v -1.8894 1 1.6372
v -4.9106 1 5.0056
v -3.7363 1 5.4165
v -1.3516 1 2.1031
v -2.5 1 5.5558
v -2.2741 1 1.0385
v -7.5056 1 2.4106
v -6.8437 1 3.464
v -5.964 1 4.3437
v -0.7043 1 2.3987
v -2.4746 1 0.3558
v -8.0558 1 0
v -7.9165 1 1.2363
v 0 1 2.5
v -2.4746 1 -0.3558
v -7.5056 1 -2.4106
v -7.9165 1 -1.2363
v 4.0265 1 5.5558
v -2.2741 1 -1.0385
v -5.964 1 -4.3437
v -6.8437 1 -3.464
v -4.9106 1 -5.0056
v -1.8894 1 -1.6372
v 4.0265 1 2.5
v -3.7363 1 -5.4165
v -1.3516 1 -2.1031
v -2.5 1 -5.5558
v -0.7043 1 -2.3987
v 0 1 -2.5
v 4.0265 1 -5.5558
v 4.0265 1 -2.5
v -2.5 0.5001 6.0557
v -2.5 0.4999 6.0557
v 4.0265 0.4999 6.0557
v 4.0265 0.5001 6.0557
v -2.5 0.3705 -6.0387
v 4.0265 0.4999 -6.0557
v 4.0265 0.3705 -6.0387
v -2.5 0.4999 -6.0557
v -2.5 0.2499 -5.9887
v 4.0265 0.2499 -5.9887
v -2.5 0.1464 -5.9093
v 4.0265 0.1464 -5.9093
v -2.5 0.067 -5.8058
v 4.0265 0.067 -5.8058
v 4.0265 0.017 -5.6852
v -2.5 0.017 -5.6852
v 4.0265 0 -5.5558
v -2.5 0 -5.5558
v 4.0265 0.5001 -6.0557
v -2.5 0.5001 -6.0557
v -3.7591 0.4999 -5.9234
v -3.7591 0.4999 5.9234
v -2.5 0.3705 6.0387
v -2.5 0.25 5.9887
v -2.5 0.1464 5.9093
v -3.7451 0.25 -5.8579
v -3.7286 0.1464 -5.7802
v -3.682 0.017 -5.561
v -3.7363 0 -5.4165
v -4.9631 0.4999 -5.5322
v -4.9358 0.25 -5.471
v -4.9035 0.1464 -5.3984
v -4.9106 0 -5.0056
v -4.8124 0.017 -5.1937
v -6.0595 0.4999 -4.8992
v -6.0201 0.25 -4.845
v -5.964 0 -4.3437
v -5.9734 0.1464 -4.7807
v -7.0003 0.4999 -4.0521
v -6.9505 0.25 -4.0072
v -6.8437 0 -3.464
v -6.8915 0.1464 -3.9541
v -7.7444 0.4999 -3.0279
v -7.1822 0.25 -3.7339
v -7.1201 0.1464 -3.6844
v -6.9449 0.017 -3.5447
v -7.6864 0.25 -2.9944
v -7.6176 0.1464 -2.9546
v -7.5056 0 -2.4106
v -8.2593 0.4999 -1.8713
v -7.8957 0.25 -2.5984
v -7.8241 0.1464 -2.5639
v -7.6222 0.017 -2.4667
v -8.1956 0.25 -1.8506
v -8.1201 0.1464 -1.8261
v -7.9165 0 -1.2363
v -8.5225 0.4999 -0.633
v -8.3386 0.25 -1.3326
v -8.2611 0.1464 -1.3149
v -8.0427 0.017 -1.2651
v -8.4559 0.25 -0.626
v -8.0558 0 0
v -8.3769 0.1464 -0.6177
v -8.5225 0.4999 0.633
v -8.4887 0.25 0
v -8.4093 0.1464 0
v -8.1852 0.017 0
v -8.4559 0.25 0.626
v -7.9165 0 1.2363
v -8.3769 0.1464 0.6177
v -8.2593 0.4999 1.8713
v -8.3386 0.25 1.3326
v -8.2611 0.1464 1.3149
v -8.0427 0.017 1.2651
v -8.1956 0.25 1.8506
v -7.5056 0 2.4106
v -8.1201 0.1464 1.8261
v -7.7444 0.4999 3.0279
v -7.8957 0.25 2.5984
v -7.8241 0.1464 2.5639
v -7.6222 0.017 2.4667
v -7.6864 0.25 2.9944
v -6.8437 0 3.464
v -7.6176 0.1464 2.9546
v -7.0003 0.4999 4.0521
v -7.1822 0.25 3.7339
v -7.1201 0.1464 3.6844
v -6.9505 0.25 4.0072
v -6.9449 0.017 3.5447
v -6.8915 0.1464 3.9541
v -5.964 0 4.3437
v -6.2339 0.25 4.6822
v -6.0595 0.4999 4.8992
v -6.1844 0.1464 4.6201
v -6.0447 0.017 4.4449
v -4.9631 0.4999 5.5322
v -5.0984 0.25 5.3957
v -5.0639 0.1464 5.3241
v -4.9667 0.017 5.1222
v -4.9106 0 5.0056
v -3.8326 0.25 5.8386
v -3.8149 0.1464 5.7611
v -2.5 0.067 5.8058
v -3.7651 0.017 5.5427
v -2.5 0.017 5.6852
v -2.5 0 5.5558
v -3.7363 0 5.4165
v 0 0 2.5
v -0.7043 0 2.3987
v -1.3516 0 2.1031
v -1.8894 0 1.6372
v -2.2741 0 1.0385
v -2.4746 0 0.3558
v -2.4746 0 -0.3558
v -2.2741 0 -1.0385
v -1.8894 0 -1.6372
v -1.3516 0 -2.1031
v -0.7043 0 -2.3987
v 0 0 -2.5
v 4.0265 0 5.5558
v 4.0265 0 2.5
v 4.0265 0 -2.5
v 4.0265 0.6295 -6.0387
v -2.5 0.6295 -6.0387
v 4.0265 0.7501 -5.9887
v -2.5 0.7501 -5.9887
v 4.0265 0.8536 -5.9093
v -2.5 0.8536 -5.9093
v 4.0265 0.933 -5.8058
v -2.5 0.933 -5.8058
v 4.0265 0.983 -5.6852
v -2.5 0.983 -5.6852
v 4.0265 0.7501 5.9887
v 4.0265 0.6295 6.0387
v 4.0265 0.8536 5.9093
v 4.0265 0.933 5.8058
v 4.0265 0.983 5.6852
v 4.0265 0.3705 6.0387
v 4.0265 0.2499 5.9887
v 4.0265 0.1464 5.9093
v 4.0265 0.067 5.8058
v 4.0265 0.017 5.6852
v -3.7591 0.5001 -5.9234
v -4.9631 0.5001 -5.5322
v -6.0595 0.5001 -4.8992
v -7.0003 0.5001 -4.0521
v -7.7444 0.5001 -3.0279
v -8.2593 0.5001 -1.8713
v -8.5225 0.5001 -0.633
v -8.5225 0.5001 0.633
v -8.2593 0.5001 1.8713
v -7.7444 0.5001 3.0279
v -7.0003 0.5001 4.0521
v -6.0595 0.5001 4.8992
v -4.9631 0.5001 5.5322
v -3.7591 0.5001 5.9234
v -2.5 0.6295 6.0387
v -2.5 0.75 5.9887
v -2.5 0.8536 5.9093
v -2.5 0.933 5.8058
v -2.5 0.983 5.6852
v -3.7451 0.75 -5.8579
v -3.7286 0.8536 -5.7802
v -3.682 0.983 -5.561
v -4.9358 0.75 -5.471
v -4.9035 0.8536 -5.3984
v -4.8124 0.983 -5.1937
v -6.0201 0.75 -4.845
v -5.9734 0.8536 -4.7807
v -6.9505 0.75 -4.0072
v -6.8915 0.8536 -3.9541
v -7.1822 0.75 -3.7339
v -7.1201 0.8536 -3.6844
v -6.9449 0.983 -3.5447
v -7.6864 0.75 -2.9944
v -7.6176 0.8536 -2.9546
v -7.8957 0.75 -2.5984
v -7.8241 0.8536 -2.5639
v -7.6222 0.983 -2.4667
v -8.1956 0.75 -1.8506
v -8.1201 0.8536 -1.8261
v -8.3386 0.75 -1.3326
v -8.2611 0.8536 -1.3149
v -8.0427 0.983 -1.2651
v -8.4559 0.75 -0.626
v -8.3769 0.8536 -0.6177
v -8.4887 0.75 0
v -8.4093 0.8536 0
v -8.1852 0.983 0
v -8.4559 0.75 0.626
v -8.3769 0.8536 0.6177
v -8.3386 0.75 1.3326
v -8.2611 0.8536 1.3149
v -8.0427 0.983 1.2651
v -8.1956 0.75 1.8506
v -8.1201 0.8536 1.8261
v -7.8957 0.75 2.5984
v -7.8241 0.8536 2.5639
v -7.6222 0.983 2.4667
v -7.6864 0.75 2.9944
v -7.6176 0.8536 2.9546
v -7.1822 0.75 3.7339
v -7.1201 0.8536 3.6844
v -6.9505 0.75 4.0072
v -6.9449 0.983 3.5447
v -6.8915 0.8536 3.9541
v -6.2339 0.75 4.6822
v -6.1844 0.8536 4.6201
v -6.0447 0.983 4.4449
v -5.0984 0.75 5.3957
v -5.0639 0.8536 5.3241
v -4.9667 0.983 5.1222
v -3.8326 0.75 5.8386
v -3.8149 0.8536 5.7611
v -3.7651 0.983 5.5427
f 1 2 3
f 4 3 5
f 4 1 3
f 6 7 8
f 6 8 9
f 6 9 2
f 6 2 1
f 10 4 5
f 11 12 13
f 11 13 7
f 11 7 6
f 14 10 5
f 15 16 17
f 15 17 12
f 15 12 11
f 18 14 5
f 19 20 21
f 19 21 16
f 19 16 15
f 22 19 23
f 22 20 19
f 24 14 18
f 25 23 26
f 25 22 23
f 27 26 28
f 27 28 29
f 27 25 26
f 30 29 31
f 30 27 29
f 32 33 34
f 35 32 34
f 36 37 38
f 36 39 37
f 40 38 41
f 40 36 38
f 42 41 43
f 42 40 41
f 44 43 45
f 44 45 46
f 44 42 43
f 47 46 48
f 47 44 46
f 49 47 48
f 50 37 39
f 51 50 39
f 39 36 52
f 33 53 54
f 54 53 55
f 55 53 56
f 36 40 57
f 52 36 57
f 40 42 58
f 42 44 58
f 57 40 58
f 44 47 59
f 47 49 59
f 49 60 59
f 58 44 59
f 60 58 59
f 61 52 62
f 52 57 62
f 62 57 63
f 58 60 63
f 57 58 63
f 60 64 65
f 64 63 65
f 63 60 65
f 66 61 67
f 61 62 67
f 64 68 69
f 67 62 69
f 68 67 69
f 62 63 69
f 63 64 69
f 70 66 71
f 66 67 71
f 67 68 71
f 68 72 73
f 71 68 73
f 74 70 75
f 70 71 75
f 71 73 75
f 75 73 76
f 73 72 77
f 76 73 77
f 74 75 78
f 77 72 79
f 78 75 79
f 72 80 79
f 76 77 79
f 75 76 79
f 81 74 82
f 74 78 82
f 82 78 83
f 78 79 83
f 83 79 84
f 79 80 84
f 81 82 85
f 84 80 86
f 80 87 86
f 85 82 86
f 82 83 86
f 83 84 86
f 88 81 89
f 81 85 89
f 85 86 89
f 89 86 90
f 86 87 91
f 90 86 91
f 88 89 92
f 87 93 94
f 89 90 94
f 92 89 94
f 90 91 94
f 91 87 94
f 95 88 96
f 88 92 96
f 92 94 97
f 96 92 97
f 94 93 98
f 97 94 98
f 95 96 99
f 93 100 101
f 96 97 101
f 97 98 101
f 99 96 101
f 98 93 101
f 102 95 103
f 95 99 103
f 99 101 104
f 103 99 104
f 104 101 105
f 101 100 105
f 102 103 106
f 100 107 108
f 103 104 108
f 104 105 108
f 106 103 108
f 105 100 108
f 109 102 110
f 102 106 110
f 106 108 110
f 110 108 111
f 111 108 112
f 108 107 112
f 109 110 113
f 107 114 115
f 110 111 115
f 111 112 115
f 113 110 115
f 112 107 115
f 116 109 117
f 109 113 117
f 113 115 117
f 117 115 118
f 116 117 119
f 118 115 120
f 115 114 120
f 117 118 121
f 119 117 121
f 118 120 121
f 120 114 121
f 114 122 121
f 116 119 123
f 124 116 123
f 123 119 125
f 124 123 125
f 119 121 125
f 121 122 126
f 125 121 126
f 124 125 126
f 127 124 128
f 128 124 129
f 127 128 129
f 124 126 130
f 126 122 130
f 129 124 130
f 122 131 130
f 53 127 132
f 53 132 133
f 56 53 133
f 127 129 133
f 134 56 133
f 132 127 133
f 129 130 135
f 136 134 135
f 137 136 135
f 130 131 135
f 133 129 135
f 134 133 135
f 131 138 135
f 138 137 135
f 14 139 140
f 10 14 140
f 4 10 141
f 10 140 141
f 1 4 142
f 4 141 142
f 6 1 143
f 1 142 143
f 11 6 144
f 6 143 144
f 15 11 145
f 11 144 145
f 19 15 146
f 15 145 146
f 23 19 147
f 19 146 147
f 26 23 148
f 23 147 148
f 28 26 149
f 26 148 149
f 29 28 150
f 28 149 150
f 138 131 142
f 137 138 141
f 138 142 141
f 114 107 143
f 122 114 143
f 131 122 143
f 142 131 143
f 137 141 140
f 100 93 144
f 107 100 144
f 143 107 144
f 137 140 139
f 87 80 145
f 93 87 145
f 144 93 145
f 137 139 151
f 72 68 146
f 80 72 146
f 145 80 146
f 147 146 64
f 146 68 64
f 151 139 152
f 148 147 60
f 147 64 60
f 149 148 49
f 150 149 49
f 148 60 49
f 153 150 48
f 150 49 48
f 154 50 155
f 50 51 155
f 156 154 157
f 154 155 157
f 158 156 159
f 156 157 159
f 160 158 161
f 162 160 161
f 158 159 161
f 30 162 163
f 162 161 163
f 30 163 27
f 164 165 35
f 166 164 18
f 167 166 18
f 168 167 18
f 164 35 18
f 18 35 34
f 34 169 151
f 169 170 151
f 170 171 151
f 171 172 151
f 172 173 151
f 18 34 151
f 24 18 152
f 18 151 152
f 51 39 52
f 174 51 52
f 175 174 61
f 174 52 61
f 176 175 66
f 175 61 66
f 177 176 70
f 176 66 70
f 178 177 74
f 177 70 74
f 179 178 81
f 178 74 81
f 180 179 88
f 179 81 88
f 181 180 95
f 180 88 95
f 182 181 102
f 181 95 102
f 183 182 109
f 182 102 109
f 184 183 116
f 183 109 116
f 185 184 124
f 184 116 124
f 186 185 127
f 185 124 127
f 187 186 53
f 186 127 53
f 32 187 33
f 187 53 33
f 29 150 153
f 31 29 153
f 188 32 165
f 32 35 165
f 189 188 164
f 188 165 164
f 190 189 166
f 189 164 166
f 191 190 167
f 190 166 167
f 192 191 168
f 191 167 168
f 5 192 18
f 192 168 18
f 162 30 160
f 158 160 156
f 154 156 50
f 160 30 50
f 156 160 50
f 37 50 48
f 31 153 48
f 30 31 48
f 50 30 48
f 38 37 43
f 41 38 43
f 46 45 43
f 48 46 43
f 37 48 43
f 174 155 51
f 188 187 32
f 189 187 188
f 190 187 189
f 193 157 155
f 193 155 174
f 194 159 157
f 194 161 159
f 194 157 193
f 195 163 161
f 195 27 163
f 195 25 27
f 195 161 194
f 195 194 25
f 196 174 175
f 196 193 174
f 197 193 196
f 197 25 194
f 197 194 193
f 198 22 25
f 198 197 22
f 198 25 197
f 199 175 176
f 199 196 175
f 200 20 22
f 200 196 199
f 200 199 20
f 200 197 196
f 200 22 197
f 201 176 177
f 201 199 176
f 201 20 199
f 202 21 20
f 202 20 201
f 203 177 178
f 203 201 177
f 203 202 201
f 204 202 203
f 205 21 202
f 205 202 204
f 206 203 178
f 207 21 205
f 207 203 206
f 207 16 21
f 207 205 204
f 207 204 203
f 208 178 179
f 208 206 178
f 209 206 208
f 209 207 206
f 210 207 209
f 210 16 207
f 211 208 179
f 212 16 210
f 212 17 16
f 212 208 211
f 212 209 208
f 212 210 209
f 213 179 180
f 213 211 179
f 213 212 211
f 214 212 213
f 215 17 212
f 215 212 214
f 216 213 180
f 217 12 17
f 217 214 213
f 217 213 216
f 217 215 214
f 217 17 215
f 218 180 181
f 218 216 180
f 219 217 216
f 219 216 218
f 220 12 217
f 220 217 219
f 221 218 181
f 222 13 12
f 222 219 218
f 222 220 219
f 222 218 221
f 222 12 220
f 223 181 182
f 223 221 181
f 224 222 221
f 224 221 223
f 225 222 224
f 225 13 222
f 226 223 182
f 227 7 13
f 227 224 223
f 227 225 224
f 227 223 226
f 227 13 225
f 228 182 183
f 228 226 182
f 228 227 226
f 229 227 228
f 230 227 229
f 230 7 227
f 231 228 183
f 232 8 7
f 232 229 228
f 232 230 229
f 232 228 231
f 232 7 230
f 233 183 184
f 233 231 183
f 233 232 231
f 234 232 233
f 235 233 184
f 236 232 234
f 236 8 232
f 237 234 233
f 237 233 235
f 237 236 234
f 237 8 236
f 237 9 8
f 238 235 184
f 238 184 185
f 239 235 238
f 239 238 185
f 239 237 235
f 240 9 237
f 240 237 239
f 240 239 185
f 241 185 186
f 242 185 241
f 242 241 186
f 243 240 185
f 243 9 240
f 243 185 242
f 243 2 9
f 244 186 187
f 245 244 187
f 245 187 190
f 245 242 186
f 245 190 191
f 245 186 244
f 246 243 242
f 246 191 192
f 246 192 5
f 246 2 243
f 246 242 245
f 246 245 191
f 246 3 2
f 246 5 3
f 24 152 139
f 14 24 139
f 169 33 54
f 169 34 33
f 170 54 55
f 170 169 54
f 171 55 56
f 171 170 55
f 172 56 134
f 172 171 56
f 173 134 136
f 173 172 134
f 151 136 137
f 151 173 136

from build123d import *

# Parameters (mm, degrees)
BOSS_EXTRUDE1_DEPTH = 1
FILLET1_R           = 0.5


with BuildPart() as part:
    # Sketch1 → Boss-Extrude1 (new body)
    with BuildSketch(Plane(origin=(0, 0, 0), x_dir=(1, 0, 0), z_dir=(0, 1, 0))):
        with BuildLine():
            Line((0, 2.5), (4.026491886, 2.5))
            Line((4.026491886, 2.5), (4.026491886, 6.055714934))
            Line((4.026491886, 6.055714934), (-2.5, 6.055714934))
            ThreePointArc((-2.5, 6.055714934), (-8.555714934, 0), (-2.5, -6.055714934))
            Line((-2.5, -6.055714934), (4.026491886, -6.055714934))
            Line((4.026491886, -6.055714934), (4.026491886, -2.5))
            Line((4.026491886, -2.5), (0, -2.5))
            ThreePointArc((0, -2.5), (-2.5, 0), (0, 2.5))
        make_face()
    extrude(amount=BOSS_EXTRUDE1_DEPTH)

    # Fillet1
    fillet1_edges = [part.edges().sort_by_distance(p)[0] for p in [
        (0.763245943, 0, -6.055714934),
        (0.763245943, 0, 6.055714934),
        (0.763245943, 1, -6.055714934),
        (0.763245943, 1, 6.055714934),
        (-8.555714934, 0, 0),
        (-8.555714934, 1, 0),
    ]]
    fillet(fillet1_edges, radius=FILLET1_R - 0.0001)  # a hair under: the kernel refuses the full size


solid = part.part
